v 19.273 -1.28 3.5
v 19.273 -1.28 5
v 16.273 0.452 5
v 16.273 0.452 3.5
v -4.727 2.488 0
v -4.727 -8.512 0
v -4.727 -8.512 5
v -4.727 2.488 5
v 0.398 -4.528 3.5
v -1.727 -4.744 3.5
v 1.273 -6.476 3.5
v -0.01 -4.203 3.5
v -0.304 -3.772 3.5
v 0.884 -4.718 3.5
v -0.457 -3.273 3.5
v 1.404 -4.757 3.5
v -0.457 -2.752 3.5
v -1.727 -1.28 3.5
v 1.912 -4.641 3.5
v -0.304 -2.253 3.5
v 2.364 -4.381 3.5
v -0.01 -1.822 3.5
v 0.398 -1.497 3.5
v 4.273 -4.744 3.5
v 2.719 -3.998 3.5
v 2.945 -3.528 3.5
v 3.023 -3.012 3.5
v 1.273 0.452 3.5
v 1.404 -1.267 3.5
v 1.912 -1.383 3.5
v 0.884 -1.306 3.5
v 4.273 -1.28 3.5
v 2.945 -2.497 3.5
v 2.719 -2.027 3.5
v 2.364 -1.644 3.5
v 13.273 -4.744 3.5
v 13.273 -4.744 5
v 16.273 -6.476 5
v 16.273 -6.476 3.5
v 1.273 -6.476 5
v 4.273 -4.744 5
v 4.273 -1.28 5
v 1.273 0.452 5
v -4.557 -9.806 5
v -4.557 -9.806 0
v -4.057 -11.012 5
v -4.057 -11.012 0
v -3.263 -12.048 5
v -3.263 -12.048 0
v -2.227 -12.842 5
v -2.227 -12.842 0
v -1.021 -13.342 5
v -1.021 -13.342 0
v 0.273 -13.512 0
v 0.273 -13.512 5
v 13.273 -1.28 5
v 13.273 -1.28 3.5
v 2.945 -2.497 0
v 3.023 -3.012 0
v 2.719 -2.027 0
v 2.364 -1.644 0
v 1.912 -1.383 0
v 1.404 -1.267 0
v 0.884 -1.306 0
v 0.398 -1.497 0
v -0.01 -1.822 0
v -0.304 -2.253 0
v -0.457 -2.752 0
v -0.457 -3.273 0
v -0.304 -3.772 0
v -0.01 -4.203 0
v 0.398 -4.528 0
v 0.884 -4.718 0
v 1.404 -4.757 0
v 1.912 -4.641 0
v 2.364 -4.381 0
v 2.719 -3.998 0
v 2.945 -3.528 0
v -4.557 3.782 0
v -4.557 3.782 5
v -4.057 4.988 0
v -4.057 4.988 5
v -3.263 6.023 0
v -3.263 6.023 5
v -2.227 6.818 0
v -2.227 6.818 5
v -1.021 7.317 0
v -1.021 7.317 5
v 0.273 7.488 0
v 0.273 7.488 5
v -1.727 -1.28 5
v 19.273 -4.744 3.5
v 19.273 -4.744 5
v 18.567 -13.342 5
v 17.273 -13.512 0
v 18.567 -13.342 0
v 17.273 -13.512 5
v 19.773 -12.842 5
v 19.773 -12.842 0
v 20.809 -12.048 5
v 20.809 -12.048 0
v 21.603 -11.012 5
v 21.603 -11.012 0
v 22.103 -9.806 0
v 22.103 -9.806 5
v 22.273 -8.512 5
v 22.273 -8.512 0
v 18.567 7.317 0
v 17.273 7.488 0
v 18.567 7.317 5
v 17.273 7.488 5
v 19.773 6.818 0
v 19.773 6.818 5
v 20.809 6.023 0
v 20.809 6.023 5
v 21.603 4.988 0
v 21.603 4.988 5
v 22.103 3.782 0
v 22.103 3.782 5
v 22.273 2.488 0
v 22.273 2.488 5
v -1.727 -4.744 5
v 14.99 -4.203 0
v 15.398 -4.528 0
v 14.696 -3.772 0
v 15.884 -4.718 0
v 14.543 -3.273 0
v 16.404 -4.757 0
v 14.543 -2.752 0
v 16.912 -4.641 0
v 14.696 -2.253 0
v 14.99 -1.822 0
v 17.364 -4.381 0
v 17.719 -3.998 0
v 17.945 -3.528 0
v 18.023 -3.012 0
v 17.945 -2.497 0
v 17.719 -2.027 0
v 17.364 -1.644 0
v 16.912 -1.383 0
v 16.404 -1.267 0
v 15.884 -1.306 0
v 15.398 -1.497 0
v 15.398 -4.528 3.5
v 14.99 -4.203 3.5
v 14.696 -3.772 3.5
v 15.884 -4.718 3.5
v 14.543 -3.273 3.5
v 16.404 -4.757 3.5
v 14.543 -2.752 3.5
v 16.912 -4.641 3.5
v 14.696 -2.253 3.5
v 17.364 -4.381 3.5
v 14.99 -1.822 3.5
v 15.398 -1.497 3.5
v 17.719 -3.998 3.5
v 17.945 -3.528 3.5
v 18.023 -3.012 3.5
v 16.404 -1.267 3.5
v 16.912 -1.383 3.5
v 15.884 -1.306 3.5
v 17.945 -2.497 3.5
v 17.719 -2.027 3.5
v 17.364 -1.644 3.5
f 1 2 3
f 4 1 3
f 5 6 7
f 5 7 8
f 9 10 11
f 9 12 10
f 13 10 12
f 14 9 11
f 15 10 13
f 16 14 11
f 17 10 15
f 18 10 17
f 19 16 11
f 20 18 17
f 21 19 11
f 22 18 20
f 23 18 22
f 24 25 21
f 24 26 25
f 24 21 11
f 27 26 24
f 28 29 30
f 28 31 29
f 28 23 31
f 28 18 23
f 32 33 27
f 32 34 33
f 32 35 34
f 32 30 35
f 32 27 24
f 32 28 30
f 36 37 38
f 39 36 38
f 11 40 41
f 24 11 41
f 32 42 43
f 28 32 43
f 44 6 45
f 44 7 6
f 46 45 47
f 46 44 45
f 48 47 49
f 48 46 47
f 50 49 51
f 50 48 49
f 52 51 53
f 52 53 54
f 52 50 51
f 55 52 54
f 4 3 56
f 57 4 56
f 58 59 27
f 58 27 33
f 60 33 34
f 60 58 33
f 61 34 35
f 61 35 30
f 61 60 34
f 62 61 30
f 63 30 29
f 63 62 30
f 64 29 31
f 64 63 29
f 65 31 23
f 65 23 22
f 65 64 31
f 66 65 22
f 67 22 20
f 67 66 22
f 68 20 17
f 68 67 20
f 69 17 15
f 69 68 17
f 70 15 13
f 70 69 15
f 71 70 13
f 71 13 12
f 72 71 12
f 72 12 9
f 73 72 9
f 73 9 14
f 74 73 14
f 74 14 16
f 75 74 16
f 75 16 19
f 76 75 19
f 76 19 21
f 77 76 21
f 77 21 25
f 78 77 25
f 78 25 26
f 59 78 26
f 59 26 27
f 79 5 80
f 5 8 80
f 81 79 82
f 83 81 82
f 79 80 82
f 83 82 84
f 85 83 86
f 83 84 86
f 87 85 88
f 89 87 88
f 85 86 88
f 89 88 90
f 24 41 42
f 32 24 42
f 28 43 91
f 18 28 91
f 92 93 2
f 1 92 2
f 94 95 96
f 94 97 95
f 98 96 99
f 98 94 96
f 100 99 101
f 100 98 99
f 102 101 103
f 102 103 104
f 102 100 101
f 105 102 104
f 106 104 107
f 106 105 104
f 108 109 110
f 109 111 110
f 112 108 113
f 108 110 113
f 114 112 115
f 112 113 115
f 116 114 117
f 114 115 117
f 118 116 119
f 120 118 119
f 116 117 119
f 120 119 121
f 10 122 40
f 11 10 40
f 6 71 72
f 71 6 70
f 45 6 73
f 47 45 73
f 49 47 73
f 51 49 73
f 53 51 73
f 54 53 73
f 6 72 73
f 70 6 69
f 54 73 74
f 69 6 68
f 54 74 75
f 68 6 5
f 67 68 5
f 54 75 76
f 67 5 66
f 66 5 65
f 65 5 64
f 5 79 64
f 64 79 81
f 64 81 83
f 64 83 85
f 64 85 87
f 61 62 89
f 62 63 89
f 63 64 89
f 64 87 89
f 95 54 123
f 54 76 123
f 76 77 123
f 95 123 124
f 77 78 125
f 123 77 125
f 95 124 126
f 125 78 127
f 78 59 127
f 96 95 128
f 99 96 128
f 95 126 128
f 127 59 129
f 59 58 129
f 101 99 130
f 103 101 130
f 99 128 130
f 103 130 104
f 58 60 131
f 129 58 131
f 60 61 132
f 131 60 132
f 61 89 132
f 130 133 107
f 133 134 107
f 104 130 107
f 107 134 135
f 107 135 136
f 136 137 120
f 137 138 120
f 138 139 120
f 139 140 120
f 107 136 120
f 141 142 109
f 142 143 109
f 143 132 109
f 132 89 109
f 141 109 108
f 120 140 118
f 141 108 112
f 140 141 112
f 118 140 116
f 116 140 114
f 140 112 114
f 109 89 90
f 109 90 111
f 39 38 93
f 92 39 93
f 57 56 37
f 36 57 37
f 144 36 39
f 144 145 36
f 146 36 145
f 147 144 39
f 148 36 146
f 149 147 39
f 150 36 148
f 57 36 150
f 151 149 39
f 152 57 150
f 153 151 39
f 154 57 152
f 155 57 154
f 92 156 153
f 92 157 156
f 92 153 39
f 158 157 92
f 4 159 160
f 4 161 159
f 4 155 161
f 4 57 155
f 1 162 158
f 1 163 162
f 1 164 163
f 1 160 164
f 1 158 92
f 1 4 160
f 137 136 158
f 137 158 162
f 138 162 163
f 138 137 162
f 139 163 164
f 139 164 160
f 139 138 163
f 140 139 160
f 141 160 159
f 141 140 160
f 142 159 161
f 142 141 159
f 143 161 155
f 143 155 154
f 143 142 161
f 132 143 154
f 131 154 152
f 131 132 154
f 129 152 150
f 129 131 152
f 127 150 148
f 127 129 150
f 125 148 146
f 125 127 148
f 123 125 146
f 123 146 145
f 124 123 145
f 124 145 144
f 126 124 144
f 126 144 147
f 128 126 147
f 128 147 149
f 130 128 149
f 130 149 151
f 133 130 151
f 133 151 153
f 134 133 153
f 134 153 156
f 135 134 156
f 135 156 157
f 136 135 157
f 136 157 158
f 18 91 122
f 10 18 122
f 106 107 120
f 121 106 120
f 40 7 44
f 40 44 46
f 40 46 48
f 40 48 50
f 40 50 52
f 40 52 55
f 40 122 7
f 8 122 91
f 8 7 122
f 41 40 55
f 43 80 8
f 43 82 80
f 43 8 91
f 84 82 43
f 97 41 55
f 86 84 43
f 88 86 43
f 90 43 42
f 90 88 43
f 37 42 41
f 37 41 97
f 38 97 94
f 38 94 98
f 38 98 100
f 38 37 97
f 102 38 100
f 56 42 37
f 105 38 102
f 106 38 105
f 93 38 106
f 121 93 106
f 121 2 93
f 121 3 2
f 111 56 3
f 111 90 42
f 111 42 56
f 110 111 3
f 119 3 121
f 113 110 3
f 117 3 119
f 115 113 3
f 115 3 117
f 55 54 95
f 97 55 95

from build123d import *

# Parameters (mm, degrees)
F0_W     = 27
F0_H     = 21
F0_R     = 1.75
F1_DEPTH = 5
F2_R     = 5
F3_R     = 1.75
F4_DEPTH = 1.5


with BuildPart() as f1:
    # F0 (on Top) → F1 (new body)
    with BuildSketch(Plane.XY):
        with Locations((8.77302, -3.012353)):
            Rectangle(F0_W, F0_H)
        with Locations((1.27302, -3.012353)):
            Circle(F0_R, mode=Mode.SUBTRACT)
        with Locations((16.27302, -3.012353)):
            Circle(F0_R, mode=Mode.SUBTRACT)
    extrude(amount=F1_DEPTH)

    # F2
    f2_edges = [f1.edges().sort_by_distance(p)[0] for p in [
        (-4.72698, -13.512353, 2.5),
        (22.27302, -13.512353, 2.5),
        (22.27302, 7.487647, 2.5),
        (-4.72698, 7.487647, 2.5),
    ]]
    fillet(f2_edges, radius=F2_R)

    # F3 (on face) → F4 (cut)
    with BuildSketch(Plane.XY.offset(5)):
        Polygon((4.27302, -4.744403), (4.27302, -1.280302), (1.27302, 0.451749), (-1.72698, -1.280302), (-1.72698, -4.744403), (1.27302, -6.476454), align=None)
        with Locations((1.27302, -3.012353)):
            Circle(F3_R, mode=Mode.SUBTRACT)
        Polygon((19.27302, -4.744403), (19.27302, -1.280302), (16.27302, 0.451749), (13.27302, -1.280302), (13.27302, -4.744403), (16.27302, -6.476454), align=None)
        with Locations((16.27302, -3.012353)):
            Circle(F3_R, mode=Mode.SUBTRACT)
    extrude(amount=-F4_DEPTH, mode=Mode.SUBTRACT)


solid = f1.part
